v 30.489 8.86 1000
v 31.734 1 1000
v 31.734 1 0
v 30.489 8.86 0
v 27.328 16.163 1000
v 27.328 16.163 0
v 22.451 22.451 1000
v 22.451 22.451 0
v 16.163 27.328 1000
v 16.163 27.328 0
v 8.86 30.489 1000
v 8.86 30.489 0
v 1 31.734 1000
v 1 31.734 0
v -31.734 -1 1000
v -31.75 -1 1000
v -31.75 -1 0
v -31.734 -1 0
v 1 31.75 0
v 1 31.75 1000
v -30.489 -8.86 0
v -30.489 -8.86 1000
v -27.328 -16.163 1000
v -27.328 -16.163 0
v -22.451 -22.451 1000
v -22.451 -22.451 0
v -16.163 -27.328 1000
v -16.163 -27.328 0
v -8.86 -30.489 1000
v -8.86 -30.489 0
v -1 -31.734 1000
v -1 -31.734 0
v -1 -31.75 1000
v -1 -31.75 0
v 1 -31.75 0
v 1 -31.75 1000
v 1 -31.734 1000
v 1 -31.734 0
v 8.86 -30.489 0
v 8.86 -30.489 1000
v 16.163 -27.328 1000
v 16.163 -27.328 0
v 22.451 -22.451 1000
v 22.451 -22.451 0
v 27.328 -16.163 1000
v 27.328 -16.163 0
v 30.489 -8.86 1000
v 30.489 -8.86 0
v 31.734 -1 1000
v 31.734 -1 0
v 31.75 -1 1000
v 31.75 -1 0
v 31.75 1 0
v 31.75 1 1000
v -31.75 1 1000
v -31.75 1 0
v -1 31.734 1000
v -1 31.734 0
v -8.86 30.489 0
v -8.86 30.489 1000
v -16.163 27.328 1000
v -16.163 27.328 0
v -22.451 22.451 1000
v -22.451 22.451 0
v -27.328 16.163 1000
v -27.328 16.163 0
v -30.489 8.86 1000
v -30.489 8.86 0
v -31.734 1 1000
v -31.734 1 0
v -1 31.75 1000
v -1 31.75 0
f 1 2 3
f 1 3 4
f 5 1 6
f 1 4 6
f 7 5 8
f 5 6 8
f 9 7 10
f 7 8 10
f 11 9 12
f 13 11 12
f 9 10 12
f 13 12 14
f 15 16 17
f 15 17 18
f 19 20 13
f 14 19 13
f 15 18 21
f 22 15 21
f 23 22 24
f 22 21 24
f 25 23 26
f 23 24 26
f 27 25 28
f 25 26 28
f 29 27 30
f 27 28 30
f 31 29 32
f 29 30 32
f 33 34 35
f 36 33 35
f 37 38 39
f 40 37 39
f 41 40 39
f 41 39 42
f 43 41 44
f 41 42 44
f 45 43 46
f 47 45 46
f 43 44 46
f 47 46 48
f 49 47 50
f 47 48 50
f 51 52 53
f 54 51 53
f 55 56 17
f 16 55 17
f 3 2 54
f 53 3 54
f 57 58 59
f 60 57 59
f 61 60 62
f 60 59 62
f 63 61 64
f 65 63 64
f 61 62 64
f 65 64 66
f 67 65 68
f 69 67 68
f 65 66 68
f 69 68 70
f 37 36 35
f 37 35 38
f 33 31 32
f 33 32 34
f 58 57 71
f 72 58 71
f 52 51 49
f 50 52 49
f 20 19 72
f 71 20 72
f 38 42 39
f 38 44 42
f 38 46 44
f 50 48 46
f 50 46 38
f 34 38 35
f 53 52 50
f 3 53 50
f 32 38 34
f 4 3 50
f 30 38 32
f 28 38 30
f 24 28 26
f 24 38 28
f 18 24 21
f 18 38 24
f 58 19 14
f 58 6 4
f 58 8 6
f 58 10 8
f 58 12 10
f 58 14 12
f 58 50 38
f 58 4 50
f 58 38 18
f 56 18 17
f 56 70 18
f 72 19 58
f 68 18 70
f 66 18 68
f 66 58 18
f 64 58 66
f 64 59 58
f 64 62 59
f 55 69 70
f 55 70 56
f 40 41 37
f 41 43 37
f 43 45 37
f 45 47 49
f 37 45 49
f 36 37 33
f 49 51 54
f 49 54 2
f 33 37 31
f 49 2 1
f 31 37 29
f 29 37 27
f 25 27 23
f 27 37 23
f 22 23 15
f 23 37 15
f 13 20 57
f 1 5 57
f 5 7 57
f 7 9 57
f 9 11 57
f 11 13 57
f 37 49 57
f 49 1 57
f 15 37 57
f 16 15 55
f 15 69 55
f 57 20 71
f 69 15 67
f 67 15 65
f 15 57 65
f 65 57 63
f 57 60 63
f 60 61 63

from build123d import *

# Parameters (mm, degrees)
CROQUIS1_R              = 31.75
SALIENTE_EXTRUIR1_DEPTH = 1000
SALIENTE_EXTRUIR2_DEPTH = 1000


with BuildPart() as part:
    # Croquis1 → Saliente-Extruir1 (new body)
    with BuildSketch(Plane.XY):
        Circle(CROQUIS1_R)
    extrude(amount=SALIENTE_EXTRUIR1_DEPTH)

    # Croquis2 → Saliente-Extruir2 (add)
    with BuildSketch(Plane.XY.offset(1000)):
        Polygon((31.75, 0), (31.75, -1), (30.75, -1), (30.75, 1), (31.75, 1), align=None)
        Polygon((-31.75, 1), (-31.75, 0), (-31.75, -1), (-30.75, -1), (-30.75, 1), align=None)
        Polygon((0, 31.75), (1, 31.75), (1, 30.75), (-1, 30.75), (-1, 31.75), align=None)
        Polygon((-1, -31.75), (0, -31.75), (1, -31.75), (1, -30.75), (-1, -30.75), align=None)
    extrude(amount=-SALIENTE_EXTRUIR2_DEPTH)


solid = part.part
